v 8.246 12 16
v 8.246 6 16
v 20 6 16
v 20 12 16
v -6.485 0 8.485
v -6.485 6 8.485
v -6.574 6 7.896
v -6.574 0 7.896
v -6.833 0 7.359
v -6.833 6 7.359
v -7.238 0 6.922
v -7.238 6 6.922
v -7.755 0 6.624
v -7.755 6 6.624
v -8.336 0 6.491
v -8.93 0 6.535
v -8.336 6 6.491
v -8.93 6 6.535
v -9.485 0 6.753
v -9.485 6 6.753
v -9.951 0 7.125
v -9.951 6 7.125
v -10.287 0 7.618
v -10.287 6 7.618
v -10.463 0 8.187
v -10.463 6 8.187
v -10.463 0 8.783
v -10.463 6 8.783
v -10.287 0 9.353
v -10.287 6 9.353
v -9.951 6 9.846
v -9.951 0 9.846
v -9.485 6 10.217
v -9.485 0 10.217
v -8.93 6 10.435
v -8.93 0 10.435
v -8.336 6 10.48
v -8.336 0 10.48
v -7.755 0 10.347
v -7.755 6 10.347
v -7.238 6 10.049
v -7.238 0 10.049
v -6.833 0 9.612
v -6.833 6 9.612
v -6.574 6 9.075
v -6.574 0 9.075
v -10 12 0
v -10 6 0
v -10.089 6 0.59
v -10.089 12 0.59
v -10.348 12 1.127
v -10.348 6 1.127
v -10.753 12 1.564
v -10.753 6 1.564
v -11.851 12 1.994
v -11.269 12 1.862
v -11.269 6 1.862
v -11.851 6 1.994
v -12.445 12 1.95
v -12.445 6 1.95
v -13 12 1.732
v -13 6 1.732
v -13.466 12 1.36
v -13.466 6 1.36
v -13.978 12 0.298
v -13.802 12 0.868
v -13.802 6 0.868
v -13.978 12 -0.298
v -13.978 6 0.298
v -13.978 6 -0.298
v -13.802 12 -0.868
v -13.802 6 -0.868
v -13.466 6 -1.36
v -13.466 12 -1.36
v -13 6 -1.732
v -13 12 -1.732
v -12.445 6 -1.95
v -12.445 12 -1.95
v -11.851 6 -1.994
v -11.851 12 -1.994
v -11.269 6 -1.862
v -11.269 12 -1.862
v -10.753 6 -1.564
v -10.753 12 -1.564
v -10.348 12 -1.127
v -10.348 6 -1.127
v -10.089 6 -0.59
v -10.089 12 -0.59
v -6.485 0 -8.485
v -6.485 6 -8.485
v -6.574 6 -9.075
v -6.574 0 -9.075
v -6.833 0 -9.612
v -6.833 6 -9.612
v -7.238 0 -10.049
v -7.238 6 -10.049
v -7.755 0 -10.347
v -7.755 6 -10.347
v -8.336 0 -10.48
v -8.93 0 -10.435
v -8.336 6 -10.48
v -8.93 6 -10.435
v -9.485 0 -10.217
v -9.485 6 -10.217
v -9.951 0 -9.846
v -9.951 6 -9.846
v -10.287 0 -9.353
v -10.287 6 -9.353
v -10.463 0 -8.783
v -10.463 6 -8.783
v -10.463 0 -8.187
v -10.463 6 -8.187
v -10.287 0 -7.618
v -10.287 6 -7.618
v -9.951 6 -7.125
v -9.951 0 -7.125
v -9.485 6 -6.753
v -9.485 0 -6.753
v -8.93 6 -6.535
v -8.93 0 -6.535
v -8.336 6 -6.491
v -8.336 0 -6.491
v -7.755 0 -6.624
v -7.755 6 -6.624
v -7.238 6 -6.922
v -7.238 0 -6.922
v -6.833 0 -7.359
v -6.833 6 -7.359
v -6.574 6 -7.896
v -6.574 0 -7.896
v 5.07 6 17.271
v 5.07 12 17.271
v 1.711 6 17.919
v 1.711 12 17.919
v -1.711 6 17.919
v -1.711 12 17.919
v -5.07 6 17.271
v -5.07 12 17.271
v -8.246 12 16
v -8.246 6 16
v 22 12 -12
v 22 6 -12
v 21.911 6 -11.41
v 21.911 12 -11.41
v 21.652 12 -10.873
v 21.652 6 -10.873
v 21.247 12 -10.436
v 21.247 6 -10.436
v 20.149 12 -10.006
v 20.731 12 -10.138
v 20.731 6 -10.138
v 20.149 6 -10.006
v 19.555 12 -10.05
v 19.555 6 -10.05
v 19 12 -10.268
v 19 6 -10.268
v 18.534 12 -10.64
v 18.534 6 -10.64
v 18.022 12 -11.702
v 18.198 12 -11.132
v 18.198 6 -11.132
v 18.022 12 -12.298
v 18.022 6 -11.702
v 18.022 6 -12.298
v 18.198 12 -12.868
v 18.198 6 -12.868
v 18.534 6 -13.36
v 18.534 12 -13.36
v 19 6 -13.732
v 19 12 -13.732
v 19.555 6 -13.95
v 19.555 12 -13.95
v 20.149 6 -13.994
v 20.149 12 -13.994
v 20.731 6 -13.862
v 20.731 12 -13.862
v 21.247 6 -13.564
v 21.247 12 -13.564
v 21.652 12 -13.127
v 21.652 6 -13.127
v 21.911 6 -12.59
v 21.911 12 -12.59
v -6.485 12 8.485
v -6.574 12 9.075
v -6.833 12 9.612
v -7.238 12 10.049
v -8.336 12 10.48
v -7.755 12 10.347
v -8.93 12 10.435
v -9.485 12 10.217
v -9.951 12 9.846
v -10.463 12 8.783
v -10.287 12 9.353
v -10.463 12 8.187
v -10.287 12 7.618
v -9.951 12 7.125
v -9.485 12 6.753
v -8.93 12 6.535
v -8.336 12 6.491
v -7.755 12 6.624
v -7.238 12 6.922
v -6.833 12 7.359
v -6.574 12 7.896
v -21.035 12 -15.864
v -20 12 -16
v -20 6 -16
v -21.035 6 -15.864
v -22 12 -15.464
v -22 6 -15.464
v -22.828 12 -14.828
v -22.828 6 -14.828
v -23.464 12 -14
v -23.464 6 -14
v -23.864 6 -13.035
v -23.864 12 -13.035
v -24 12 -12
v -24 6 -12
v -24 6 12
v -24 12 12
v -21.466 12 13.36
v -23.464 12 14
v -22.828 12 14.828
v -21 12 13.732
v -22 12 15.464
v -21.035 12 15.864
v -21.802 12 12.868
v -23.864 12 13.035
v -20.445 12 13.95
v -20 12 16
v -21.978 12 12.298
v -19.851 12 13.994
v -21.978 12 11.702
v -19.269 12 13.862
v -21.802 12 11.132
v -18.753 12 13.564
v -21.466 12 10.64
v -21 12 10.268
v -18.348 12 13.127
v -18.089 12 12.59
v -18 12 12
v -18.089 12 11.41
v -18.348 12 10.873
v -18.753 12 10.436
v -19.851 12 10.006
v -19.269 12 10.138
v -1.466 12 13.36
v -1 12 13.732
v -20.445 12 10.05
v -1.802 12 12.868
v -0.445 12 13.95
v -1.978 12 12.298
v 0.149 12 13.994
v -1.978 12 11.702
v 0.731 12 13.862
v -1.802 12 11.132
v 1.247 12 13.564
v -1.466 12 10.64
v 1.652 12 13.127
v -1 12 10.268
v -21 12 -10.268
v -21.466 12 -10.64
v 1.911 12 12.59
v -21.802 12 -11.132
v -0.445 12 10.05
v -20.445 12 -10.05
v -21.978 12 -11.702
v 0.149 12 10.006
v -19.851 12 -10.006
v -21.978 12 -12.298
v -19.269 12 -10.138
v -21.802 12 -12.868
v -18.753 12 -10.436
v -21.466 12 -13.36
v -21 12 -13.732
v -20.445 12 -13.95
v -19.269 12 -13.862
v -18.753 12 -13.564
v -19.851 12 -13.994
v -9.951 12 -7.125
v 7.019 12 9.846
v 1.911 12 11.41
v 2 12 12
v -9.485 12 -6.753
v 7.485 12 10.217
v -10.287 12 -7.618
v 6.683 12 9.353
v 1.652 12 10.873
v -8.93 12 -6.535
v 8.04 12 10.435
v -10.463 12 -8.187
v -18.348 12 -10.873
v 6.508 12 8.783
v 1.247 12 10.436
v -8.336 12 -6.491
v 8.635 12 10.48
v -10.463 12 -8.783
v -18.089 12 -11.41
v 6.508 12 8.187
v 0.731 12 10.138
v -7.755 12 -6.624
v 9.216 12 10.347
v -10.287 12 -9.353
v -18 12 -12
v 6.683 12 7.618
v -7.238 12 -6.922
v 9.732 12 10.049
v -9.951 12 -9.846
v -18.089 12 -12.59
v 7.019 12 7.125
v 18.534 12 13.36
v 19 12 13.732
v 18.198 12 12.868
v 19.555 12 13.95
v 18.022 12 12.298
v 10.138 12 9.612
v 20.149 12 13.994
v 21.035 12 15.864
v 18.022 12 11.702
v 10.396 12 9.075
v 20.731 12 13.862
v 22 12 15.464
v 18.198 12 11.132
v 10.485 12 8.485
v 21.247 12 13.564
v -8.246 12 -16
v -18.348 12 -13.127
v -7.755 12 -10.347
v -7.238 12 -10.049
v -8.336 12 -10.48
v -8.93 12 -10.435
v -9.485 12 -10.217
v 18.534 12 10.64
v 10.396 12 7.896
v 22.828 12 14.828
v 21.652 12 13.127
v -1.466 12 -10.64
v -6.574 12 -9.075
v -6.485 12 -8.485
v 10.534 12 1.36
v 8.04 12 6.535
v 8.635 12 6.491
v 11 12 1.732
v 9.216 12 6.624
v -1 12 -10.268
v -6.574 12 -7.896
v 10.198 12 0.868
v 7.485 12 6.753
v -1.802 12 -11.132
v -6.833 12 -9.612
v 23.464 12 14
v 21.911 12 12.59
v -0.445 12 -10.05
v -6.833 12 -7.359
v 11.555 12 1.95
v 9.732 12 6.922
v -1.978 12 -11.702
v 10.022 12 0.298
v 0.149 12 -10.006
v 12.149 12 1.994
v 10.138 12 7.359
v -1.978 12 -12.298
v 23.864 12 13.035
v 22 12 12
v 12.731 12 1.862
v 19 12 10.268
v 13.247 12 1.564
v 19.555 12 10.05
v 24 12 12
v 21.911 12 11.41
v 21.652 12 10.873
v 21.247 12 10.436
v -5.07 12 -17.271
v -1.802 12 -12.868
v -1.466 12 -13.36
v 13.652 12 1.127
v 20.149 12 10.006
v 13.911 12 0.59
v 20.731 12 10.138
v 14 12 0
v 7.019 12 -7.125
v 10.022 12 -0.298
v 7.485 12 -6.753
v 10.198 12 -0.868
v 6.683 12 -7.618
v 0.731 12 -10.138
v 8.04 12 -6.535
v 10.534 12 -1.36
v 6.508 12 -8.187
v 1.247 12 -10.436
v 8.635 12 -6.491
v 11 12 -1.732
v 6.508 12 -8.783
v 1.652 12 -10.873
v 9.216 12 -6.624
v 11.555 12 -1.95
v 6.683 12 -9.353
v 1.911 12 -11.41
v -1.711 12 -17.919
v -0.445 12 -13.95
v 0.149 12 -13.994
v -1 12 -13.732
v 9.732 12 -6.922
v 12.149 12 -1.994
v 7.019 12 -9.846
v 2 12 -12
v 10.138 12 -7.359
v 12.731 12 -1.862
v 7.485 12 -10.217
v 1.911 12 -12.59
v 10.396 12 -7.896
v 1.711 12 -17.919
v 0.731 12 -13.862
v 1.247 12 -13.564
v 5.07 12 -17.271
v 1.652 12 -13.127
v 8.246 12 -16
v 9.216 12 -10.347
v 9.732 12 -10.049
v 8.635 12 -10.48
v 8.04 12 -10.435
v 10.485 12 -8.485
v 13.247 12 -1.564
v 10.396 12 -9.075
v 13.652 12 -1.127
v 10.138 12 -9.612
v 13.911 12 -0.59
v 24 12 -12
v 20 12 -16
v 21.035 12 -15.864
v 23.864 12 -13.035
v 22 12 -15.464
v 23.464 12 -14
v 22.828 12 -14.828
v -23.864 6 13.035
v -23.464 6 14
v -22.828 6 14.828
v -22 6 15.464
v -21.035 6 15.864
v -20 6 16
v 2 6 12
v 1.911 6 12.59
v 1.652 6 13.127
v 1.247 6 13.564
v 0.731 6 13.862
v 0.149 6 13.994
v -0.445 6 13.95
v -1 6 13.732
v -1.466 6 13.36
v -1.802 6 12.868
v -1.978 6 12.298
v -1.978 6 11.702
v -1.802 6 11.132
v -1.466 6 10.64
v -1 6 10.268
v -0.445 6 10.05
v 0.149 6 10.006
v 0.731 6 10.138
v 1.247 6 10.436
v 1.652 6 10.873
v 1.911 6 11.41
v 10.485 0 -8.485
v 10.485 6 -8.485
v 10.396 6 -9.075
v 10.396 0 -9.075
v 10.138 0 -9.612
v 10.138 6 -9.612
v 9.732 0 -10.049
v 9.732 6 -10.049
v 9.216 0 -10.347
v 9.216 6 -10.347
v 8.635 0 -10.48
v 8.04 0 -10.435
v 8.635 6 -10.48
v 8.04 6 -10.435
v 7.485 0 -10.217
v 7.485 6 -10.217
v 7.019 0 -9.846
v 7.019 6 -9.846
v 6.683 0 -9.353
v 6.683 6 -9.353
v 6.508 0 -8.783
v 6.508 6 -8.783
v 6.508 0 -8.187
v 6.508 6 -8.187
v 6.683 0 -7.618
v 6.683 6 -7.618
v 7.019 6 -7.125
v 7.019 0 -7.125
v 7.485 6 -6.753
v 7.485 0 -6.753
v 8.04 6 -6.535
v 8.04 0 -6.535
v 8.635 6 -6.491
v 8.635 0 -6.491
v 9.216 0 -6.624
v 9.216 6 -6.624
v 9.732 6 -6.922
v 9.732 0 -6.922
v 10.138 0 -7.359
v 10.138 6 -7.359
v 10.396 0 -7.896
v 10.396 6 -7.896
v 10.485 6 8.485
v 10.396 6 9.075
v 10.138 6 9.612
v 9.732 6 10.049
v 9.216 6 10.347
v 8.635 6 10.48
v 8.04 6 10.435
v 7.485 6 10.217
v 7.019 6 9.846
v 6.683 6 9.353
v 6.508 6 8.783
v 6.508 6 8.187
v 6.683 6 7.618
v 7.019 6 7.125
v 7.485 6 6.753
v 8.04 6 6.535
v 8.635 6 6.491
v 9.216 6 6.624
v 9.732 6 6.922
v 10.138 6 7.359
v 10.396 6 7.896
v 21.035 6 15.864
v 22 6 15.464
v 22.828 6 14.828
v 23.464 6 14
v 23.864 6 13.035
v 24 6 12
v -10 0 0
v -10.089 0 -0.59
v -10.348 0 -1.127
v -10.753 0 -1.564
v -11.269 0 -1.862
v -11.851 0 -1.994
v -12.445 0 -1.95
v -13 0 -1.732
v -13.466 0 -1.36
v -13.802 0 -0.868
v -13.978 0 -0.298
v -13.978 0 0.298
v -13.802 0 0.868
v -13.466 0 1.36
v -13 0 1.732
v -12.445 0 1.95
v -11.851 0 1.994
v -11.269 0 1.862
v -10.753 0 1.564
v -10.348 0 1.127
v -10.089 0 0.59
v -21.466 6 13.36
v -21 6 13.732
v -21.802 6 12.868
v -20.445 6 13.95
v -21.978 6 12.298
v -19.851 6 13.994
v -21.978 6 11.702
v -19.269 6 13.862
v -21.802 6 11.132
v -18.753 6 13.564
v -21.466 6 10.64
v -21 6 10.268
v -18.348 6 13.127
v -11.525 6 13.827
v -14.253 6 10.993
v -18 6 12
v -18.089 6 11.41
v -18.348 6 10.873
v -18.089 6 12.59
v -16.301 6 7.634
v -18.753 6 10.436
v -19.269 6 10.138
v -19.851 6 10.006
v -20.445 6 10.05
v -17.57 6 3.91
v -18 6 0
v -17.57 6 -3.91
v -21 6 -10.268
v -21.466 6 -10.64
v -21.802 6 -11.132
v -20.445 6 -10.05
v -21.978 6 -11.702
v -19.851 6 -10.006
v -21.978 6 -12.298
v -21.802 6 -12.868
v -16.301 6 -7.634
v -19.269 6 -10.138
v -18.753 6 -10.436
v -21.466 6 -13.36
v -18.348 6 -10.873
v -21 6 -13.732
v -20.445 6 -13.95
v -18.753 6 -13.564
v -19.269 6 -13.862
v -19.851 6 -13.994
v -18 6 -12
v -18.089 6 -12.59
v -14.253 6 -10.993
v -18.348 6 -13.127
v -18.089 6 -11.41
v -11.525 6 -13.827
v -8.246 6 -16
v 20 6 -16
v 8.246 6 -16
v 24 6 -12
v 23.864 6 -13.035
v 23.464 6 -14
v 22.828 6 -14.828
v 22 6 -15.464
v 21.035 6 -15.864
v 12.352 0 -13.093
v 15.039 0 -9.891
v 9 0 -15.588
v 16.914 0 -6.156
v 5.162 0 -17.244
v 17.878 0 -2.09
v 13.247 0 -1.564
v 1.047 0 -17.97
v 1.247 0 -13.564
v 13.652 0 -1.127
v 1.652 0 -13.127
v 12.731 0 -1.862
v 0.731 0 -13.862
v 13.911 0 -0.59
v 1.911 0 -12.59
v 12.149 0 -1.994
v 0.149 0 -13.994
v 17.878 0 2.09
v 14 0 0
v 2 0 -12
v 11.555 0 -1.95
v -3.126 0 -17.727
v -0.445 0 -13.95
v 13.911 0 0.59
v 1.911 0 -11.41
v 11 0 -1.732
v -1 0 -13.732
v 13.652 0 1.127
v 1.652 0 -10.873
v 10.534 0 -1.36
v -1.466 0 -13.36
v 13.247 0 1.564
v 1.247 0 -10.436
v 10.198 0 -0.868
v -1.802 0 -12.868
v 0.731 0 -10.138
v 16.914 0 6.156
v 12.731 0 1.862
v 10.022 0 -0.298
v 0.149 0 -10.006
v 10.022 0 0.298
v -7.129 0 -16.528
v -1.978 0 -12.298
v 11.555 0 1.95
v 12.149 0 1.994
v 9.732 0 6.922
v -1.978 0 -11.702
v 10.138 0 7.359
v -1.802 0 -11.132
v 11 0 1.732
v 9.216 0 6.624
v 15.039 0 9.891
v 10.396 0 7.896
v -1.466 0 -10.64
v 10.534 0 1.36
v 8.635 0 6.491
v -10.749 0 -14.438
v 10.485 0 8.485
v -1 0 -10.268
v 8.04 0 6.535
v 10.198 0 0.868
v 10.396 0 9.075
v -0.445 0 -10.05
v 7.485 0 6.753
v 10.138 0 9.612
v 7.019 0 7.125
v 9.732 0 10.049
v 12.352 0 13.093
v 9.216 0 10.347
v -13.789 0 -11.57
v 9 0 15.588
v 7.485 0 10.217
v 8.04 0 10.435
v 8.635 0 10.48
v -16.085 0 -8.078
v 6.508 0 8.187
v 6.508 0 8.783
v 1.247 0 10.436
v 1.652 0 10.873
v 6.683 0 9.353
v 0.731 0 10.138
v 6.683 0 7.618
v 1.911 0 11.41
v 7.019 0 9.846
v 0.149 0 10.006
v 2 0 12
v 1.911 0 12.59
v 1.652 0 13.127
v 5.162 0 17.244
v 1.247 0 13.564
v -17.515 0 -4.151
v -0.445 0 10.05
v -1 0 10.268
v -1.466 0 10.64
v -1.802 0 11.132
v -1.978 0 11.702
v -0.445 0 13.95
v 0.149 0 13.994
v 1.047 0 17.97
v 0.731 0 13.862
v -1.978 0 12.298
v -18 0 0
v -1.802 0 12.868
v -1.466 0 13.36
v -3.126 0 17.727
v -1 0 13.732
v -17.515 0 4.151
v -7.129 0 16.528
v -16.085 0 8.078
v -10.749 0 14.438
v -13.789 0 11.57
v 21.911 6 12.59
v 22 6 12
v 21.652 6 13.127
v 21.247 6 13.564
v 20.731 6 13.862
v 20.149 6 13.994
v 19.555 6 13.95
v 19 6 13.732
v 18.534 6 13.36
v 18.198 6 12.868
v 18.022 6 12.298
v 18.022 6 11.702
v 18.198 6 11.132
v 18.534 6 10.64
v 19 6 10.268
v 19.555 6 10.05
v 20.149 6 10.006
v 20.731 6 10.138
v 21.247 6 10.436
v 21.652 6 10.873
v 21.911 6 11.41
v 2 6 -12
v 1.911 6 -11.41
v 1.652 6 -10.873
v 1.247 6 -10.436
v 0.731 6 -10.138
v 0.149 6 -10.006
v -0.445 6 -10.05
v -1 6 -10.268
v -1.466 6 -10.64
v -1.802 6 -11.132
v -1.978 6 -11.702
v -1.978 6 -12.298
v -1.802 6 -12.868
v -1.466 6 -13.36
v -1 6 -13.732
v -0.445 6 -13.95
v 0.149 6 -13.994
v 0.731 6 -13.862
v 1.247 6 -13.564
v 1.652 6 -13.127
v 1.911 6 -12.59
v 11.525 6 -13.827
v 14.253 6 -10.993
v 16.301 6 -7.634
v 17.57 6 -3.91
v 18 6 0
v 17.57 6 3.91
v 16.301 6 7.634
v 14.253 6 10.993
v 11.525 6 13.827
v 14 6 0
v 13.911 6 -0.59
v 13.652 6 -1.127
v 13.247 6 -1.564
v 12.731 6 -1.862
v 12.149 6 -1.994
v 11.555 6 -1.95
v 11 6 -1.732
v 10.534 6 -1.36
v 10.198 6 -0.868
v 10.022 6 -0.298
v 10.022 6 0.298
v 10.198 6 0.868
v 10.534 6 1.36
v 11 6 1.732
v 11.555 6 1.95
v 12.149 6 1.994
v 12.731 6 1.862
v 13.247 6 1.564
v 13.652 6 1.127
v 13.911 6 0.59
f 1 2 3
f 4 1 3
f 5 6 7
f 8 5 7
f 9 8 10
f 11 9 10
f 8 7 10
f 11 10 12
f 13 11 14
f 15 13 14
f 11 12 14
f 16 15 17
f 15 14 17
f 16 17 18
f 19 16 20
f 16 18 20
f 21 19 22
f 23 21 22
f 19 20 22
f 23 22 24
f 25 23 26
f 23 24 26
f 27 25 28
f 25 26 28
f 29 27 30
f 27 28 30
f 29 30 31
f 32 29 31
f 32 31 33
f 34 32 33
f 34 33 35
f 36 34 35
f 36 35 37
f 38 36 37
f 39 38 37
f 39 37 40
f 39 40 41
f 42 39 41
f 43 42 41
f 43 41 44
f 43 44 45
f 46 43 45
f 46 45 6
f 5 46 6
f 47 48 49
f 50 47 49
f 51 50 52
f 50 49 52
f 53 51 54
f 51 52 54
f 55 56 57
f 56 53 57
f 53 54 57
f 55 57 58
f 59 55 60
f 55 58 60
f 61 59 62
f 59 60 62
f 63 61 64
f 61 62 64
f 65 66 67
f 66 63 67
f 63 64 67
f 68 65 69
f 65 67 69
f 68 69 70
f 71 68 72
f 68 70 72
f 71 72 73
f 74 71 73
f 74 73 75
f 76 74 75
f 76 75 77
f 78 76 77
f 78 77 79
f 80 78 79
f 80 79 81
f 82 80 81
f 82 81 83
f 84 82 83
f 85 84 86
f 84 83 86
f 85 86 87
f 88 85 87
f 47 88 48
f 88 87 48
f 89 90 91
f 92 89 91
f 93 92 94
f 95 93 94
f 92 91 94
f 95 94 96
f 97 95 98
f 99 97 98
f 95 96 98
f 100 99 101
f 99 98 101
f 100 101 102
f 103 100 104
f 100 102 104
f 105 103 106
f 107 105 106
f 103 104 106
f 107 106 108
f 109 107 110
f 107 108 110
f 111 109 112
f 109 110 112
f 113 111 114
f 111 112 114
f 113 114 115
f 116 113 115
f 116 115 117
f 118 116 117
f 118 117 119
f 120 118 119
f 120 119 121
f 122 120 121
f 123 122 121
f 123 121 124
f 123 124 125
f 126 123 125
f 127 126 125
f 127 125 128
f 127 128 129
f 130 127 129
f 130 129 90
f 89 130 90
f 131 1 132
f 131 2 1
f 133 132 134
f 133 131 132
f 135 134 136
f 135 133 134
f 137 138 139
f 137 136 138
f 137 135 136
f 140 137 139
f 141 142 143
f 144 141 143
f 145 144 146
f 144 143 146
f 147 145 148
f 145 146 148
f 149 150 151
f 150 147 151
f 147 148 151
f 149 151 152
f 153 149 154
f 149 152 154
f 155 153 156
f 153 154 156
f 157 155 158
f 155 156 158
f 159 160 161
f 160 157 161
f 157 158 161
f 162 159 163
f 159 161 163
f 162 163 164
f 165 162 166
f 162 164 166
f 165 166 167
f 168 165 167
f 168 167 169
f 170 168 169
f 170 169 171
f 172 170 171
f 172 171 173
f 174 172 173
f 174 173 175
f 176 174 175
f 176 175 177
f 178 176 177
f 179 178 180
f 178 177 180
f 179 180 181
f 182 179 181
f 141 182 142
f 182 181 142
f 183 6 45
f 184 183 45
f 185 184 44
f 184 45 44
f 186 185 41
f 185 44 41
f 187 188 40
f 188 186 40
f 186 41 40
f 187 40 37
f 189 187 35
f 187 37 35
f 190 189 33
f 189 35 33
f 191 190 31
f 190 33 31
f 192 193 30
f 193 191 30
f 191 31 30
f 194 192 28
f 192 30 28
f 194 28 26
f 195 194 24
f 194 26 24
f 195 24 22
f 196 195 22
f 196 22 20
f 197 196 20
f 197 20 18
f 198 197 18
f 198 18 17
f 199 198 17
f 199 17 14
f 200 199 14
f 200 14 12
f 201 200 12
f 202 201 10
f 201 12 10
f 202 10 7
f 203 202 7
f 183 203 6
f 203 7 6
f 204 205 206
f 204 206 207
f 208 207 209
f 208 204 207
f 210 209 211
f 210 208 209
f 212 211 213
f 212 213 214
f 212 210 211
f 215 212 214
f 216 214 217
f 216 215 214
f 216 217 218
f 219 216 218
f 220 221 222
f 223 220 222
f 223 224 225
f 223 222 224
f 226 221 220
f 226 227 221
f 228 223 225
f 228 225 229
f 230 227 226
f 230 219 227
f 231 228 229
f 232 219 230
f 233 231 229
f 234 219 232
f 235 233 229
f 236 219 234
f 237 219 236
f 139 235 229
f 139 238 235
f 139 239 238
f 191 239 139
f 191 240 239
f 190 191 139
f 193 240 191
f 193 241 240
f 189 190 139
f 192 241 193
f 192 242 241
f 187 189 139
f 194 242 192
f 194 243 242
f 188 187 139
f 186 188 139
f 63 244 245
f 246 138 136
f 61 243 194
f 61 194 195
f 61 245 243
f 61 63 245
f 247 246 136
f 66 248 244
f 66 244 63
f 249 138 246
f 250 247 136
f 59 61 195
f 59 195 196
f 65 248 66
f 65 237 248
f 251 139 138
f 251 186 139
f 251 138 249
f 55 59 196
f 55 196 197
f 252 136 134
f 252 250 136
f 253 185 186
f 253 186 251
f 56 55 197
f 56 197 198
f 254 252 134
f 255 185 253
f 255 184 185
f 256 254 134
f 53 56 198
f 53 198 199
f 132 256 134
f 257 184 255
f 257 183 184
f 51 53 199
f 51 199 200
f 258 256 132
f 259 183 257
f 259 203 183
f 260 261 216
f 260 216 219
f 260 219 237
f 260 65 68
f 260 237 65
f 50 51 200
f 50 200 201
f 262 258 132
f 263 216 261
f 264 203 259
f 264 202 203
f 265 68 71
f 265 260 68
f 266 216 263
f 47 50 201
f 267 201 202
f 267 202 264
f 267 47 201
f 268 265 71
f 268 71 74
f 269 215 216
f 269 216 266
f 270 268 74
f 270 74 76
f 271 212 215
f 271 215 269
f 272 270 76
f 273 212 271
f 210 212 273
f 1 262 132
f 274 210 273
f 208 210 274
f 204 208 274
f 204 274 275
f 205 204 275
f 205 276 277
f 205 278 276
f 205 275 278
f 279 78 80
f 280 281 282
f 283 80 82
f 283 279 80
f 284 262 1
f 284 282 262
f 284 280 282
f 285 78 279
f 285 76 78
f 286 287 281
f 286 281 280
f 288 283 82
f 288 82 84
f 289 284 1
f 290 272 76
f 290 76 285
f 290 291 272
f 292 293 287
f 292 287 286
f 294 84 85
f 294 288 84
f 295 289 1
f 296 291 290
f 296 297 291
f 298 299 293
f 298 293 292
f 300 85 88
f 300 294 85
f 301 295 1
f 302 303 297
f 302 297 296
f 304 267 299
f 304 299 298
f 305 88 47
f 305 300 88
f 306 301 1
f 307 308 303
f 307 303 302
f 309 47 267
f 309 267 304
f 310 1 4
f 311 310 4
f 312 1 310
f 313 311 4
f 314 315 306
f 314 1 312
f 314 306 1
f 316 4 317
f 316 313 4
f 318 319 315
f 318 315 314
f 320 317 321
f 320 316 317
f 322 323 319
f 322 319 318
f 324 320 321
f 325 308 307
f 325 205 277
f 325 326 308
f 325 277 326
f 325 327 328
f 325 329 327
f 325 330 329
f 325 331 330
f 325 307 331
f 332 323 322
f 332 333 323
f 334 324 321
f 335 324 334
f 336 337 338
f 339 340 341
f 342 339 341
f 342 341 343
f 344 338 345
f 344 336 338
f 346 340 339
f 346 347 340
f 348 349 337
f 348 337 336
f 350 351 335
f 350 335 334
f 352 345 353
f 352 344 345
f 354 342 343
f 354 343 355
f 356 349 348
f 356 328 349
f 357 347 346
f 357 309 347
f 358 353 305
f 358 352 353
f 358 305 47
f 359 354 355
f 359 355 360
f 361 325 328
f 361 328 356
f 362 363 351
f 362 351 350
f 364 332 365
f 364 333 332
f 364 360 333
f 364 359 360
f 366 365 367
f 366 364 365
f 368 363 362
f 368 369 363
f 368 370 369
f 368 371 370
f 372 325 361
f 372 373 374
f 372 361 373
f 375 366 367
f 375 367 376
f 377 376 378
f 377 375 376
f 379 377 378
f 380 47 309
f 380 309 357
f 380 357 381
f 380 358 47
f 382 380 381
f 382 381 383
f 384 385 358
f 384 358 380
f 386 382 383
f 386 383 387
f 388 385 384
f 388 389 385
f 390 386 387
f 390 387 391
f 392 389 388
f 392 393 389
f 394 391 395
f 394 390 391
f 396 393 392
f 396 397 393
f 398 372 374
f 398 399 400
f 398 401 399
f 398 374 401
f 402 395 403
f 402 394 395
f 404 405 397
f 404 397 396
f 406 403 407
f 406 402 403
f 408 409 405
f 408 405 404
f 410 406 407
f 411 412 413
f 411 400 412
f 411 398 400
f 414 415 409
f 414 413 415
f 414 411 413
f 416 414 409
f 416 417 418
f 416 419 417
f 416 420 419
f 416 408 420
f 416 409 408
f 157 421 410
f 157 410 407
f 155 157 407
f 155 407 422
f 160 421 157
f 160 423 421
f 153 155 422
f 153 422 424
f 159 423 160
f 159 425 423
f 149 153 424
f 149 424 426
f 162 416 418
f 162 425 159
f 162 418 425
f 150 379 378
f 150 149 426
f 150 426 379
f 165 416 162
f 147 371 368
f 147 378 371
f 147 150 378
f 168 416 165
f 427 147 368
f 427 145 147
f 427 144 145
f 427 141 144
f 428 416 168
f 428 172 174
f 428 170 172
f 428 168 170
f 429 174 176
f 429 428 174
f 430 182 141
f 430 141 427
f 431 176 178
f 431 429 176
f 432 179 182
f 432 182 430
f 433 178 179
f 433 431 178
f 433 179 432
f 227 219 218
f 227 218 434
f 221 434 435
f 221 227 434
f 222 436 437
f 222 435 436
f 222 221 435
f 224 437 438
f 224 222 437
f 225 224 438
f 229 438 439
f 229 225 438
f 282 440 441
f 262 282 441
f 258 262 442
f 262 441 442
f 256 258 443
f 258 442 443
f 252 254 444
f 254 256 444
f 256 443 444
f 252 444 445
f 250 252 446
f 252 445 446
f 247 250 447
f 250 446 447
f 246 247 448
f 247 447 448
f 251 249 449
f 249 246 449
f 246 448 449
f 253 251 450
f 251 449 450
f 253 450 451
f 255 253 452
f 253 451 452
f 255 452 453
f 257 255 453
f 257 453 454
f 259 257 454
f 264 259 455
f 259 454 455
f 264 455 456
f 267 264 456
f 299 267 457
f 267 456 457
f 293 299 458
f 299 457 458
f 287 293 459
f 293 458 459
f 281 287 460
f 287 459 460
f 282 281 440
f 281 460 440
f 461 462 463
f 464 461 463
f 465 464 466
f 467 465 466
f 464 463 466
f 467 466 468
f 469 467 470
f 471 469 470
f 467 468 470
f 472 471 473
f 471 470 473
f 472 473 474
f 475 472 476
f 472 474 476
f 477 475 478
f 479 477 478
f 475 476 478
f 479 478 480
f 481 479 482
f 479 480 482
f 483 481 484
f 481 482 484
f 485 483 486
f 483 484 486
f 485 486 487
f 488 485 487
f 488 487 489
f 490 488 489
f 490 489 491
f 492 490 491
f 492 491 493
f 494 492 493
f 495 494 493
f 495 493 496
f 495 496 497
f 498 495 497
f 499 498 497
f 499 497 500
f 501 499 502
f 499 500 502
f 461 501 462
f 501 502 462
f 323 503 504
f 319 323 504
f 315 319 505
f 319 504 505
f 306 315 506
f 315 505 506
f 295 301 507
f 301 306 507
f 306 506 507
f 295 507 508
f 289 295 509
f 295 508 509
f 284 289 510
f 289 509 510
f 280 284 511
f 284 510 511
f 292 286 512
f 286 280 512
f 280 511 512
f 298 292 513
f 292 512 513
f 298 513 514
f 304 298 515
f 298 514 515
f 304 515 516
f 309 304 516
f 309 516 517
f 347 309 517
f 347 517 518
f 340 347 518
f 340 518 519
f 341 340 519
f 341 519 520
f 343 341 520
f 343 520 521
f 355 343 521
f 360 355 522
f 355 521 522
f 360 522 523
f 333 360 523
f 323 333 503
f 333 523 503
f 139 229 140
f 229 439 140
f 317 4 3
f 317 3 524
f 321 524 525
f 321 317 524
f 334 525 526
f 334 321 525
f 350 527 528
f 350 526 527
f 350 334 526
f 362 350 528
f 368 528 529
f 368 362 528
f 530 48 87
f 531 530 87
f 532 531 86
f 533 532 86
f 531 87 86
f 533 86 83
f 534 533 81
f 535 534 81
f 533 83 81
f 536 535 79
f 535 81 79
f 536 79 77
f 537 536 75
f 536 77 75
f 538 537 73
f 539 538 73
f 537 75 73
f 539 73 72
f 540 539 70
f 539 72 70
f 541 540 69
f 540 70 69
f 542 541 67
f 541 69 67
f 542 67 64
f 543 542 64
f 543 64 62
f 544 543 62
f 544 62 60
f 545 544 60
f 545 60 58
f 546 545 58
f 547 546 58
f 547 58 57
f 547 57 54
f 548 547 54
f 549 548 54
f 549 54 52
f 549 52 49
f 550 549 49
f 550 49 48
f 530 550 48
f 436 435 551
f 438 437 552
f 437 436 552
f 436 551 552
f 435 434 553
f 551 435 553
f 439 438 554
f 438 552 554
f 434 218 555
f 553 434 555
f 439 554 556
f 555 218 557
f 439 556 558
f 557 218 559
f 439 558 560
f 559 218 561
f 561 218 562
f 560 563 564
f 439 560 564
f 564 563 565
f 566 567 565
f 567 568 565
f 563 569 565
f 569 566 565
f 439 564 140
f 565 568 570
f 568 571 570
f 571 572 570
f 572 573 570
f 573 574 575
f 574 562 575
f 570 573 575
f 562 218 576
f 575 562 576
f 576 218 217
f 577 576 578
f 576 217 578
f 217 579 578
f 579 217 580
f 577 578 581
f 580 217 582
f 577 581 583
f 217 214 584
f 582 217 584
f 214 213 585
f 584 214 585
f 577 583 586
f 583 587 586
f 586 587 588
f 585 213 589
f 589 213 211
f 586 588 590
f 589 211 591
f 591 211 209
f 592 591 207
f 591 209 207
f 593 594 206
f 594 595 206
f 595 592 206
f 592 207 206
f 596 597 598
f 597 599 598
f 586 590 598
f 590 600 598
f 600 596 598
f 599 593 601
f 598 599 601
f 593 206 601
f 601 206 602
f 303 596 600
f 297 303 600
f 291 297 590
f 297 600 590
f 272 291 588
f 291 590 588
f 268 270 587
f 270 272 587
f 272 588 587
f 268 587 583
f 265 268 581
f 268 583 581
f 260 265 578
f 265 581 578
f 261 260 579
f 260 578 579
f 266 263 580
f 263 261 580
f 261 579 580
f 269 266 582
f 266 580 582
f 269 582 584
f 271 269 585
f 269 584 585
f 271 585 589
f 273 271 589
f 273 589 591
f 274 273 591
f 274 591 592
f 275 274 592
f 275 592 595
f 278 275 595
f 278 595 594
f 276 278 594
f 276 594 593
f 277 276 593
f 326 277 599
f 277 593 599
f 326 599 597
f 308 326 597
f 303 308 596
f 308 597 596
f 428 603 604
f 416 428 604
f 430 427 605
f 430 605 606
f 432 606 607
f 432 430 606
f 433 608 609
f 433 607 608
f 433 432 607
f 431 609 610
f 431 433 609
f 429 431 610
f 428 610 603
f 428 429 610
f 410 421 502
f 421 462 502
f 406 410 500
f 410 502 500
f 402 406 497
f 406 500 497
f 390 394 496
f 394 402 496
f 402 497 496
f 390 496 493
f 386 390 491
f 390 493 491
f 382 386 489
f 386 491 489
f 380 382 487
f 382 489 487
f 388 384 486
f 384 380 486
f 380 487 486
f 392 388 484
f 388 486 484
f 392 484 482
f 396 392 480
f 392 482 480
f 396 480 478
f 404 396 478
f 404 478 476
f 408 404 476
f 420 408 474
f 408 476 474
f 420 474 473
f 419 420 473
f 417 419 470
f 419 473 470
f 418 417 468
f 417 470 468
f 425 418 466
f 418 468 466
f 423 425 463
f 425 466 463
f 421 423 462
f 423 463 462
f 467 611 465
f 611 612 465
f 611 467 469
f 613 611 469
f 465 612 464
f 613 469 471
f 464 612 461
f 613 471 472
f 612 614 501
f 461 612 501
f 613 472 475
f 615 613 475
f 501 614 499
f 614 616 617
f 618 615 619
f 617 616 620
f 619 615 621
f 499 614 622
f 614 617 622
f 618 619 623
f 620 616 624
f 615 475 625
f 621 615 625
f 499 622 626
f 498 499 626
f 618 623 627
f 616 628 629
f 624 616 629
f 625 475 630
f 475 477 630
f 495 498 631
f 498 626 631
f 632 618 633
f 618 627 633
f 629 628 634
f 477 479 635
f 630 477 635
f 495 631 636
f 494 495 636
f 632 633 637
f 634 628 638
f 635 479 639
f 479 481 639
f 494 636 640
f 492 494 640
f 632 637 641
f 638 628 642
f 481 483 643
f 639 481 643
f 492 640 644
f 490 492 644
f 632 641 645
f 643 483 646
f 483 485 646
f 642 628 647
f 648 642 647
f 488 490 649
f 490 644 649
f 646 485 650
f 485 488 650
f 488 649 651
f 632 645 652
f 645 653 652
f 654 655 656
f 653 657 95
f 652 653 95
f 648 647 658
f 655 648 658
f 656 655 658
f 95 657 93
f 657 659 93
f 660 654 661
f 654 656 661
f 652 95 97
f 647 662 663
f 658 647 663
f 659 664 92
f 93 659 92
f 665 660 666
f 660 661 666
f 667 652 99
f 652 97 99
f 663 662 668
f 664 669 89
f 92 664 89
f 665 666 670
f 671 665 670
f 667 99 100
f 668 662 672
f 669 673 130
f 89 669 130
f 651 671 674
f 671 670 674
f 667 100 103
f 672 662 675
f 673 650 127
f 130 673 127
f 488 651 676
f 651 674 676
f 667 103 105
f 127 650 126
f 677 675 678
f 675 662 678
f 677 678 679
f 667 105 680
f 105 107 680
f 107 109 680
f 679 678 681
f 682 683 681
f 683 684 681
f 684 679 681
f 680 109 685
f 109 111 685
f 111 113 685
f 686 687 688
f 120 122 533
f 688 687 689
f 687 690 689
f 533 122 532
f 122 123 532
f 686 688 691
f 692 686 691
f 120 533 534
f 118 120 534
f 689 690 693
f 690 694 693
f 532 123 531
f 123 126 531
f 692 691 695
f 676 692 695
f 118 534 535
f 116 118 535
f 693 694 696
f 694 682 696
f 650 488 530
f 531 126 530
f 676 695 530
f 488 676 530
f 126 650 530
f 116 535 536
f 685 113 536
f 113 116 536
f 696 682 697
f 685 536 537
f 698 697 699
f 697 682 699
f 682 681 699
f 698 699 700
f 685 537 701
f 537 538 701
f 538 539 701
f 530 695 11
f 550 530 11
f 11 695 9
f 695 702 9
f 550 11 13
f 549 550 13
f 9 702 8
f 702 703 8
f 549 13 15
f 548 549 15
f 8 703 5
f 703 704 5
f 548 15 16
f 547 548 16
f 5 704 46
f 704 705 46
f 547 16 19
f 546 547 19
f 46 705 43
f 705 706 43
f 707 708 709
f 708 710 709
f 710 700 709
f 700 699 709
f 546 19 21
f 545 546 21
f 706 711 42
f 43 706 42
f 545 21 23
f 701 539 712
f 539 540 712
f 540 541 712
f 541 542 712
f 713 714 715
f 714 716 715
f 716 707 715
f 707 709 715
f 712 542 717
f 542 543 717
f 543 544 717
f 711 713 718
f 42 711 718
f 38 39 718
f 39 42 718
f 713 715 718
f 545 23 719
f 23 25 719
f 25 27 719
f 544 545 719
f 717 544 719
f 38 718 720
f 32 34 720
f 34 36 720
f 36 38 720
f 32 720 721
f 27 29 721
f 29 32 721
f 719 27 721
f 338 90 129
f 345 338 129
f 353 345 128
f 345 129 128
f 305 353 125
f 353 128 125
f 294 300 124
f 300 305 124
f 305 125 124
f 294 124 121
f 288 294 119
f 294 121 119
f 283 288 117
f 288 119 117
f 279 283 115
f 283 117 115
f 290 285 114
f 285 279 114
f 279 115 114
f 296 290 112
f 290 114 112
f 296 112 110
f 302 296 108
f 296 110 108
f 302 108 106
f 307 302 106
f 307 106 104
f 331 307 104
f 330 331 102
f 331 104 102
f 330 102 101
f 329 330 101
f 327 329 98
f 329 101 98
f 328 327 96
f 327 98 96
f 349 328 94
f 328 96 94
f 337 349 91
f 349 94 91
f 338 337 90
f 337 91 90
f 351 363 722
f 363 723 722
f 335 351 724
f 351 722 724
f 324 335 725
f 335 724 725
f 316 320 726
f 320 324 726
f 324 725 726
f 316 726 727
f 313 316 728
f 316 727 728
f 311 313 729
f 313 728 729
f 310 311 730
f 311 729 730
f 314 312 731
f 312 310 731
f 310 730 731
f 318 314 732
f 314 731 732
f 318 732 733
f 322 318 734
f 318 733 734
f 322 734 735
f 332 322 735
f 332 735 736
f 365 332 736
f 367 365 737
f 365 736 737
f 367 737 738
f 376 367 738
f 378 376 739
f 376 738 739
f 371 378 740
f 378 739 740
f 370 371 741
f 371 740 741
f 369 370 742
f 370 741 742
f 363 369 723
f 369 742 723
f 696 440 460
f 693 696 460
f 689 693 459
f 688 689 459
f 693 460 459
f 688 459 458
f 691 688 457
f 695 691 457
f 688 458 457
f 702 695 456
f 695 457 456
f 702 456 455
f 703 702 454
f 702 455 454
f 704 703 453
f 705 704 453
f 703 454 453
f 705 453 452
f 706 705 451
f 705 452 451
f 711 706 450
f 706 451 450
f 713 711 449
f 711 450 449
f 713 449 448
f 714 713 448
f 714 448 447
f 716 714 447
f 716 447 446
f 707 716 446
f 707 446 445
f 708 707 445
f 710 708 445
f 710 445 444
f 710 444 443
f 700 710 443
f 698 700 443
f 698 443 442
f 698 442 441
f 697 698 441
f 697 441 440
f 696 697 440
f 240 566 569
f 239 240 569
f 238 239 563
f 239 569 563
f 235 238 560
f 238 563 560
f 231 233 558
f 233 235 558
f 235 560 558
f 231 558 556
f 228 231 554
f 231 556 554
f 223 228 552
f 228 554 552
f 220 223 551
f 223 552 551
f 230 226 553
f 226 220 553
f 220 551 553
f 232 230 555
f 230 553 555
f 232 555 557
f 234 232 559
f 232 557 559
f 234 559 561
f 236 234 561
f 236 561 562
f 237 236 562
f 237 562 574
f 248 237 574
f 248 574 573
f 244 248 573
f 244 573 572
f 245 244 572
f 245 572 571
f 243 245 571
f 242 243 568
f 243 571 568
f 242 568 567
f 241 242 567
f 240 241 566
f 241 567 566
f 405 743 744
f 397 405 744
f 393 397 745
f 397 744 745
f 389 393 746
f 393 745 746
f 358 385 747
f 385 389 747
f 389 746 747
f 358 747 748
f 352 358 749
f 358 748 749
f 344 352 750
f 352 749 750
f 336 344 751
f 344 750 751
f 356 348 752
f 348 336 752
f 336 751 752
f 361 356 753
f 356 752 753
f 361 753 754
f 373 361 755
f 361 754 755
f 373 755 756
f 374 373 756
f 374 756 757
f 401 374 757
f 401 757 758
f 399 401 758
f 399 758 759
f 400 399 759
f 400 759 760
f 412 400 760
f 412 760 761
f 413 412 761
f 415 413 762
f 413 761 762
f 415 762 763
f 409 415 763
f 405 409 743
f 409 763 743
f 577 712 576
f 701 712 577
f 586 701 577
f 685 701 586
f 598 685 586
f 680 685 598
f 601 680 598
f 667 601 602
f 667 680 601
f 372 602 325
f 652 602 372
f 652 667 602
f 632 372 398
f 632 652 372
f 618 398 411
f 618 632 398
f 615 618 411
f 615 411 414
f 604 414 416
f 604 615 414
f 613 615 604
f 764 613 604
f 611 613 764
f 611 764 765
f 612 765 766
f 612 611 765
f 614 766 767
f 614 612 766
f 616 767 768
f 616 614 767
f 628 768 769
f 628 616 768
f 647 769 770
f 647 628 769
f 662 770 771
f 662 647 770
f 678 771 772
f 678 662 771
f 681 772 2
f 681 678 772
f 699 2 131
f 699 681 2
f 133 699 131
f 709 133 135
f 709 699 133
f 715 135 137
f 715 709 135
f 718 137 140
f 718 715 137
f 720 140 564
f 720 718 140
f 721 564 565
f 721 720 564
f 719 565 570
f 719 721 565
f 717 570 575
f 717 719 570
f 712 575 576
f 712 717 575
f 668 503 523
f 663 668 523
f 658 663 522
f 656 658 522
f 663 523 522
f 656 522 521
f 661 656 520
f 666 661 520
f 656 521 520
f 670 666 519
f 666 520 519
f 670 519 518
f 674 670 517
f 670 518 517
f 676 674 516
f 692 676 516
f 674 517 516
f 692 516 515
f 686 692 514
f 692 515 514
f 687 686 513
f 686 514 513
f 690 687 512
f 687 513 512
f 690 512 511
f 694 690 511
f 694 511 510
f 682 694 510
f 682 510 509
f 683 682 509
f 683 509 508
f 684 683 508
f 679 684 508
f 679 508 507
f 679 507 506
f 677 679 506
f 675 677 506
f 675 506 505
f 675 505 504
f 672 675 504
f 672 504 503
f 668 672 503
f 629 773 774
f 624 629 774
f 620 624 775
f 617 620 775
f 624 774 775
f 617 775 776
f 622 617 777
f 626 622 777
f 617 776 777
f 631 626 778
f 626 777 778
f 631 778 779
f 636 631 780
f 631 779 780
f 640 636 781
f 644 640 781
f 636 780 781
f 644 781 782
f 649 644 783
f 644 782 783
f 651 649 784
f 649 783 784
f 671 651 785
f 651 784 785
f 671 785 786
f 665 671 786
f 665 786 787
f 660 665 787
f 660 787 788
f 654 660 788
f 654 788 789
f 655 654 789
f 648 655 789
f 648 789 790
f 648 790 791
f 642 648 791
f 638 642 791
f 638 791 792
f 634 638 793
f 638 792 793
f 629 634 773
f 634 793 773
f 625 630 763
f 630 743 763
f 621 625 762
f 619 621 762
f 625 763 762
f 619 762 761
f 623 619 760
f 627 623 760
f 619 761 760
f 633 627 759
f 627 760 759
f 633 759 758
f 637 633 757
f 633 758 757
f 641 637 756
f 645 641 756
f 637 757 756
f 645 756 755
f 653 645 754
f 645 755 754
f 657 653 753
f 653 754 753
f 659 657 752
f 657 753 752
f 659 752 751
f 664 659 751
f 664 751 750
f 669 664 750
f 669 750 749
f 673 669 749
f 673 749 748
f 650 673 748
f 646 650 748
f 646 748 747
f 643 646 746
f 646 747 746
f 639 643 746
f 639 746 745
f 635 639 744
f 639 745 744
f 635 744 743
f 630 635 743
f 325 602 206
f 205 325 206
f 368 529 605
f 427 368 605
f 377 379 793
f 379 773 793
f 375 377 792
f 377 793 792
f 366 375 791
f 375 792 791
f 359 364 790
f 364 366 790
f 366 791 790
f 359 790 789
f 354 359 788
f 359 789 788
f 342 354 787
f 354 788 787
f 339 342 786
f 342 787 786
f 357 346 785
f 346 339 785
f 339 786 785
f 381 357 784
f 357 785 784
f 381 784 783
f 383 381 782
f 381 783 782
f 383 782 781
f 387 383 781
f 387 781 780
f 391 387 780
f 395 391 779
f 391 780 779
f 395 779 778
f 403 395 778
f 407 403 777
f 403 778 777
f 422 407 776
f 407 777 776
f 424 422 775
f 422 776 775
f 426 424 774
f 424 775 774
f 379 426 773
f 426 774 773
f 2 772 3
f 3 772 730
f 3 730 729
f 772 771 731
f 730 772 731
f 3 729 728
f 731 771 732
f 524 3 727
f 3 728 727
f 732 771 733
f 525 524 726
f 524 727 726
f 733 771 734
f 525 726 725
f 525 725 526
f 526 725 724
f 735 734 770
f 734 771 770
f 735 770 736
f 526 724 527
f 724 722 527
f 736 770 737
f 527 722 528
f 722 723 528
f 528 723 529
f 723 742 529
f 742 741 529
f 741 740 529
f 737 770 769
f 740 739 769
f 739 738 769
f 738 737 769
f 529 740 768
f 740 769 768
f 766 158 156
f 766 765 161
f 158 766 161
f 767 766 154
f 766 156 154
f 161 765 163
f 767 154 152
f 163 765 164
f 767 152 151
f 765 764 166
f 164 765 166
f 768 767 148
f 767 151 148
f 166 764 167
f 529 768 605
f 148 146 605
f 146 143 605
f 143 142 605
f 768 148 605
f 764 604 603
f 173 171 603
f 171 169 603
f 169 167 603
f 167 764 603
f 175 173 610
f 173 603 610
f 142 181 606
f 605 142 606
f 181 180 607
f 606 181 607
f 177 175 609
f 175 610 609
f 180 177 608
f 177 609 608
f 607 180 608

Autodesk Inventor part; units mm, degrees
ref_plane "YZ Plane" through (0, 0, 0) normal (1, 0, 0) x (0, 1, 0)
ref_plane "XZ Plane" through (0, 0, 0) normal (0, 1, 0) x (-1, 0, 0)
ref_plane "XY Plane" through (0, 0, 0) normal (0, 0, 1) x (1, 0, 0)
sketch "Sketch1" plane through (0, 0, 0) normal (0, 1, 0) x (-1, 0, 0)
  circle A0 centre (0, 0) radius 18
  dimension "d0" = 36
extrude "Extrusion1" add sketch "Sketch1" along normal blind 6
sketch "Sketch2" plane through (0, 6, 0) normal (0, 1, 0) x (1, 0, 0)
  circle A0 centre (0, 12) radius 2
  circle A1 centre (-8.4853, 8.4853) radius 2
  circle A2 centre (-12, 0) radius 2
  circle A3 centre (-8.4853, -8.4853) radius 2
  circle A4 centre (0, -12) radius 2
  circle A5 centre (8.4853, -8.4853) radius 2
  circle A6 centre (12, 0) radius 2
  circle A7 centre (8.4853, 8.4853) radius 2
  point P0 (0, 0)
  dimension "d3" = 4
  dimension "d4" = 12
  dimension "d7" = 360
extrude "Extrusion2" cut sketch "Sketch2" against normal through all
sketch "Sketch3" plane through (0, 6, 0) normal (0, 1, 0) x (1, 0, 0)
  line L0 (-24, -16) -> (24, -16)
  line L1 (24, -16) -> (24, 16)
  line L2 (24, 16) -> (-24, 16)
  line L3 (-24, 16) -> (-24, -16)
  line L4 (-24, -16) -> (24, 16) construction
  line L5 (24, -16) -> (-24, 16) construction
  circle A0 centre (20, -12) radius 2
  line L6 (0, 0) -> (0, 16) construction
  line L7 (0, 0) -> (-24, 0) construction
  circle A1 centre (20, 12) radius 2
  circle A2 centre (-20, -12) radius 2
  circle A3 centre (-20, 12) radius 2
  circle A4 centre (0, 0) radius 18 projected
  circle A5 centre (0, -12) radius 2 projected
  circle A6 centre (12, 0) radius 2 projected
  circle A7 centre (-8.4853, 8.4853) radius 2 projected
  circle A8 centre (-8.4853, -8.4853) radius 2 projected
  circle A9 centre (-12, 0) radius 2 projected
  circle A10 centre (0, 12) radius 2 projected
  circle A11 centre (8.4853, -8.4853) radius 2 projected
  circle A12 centre (8.4853, 8.4853) radius 2 projected
  circle A13 centre (0, 0) radius 18 projected
  point P0 (-8.2462, 16)
  point P1 (-8.2462, -16)
  point P2 (8.2462, -16)
  point P3 (8.2462, 16)
  dimension "d11" = 48
  dimension "d12" = 32
  dimension "d13" = 4
  dimension "d14" = 20
  dimension "d15" = 12
extrude "Extrusion3" add sketch "Sketch3" along normal blind 6
fillet "Fillet1" radius 4 4 edges at (24, 9, -16) (24, 9, 16) (-24, 9, -16) (-24, 9, 16)
thread "Thread1" size "M4x0.7" class "6H" standard "ANSI Metric M Profile" full length
thread "Thread2" size "M4x0.7" class "6H" standard "ANSI Metric M Profile" full length
thread "Thread3" size "M4x0.7" class "6H" standard "ANSI Metric M Profile" full length
thread "Thread4" size "M4x0.7" class "6H" standard "ANSI Metric M Profile" full length
properties part number "ArmBearingClampingPlate1" material "Aluminum 6061"
